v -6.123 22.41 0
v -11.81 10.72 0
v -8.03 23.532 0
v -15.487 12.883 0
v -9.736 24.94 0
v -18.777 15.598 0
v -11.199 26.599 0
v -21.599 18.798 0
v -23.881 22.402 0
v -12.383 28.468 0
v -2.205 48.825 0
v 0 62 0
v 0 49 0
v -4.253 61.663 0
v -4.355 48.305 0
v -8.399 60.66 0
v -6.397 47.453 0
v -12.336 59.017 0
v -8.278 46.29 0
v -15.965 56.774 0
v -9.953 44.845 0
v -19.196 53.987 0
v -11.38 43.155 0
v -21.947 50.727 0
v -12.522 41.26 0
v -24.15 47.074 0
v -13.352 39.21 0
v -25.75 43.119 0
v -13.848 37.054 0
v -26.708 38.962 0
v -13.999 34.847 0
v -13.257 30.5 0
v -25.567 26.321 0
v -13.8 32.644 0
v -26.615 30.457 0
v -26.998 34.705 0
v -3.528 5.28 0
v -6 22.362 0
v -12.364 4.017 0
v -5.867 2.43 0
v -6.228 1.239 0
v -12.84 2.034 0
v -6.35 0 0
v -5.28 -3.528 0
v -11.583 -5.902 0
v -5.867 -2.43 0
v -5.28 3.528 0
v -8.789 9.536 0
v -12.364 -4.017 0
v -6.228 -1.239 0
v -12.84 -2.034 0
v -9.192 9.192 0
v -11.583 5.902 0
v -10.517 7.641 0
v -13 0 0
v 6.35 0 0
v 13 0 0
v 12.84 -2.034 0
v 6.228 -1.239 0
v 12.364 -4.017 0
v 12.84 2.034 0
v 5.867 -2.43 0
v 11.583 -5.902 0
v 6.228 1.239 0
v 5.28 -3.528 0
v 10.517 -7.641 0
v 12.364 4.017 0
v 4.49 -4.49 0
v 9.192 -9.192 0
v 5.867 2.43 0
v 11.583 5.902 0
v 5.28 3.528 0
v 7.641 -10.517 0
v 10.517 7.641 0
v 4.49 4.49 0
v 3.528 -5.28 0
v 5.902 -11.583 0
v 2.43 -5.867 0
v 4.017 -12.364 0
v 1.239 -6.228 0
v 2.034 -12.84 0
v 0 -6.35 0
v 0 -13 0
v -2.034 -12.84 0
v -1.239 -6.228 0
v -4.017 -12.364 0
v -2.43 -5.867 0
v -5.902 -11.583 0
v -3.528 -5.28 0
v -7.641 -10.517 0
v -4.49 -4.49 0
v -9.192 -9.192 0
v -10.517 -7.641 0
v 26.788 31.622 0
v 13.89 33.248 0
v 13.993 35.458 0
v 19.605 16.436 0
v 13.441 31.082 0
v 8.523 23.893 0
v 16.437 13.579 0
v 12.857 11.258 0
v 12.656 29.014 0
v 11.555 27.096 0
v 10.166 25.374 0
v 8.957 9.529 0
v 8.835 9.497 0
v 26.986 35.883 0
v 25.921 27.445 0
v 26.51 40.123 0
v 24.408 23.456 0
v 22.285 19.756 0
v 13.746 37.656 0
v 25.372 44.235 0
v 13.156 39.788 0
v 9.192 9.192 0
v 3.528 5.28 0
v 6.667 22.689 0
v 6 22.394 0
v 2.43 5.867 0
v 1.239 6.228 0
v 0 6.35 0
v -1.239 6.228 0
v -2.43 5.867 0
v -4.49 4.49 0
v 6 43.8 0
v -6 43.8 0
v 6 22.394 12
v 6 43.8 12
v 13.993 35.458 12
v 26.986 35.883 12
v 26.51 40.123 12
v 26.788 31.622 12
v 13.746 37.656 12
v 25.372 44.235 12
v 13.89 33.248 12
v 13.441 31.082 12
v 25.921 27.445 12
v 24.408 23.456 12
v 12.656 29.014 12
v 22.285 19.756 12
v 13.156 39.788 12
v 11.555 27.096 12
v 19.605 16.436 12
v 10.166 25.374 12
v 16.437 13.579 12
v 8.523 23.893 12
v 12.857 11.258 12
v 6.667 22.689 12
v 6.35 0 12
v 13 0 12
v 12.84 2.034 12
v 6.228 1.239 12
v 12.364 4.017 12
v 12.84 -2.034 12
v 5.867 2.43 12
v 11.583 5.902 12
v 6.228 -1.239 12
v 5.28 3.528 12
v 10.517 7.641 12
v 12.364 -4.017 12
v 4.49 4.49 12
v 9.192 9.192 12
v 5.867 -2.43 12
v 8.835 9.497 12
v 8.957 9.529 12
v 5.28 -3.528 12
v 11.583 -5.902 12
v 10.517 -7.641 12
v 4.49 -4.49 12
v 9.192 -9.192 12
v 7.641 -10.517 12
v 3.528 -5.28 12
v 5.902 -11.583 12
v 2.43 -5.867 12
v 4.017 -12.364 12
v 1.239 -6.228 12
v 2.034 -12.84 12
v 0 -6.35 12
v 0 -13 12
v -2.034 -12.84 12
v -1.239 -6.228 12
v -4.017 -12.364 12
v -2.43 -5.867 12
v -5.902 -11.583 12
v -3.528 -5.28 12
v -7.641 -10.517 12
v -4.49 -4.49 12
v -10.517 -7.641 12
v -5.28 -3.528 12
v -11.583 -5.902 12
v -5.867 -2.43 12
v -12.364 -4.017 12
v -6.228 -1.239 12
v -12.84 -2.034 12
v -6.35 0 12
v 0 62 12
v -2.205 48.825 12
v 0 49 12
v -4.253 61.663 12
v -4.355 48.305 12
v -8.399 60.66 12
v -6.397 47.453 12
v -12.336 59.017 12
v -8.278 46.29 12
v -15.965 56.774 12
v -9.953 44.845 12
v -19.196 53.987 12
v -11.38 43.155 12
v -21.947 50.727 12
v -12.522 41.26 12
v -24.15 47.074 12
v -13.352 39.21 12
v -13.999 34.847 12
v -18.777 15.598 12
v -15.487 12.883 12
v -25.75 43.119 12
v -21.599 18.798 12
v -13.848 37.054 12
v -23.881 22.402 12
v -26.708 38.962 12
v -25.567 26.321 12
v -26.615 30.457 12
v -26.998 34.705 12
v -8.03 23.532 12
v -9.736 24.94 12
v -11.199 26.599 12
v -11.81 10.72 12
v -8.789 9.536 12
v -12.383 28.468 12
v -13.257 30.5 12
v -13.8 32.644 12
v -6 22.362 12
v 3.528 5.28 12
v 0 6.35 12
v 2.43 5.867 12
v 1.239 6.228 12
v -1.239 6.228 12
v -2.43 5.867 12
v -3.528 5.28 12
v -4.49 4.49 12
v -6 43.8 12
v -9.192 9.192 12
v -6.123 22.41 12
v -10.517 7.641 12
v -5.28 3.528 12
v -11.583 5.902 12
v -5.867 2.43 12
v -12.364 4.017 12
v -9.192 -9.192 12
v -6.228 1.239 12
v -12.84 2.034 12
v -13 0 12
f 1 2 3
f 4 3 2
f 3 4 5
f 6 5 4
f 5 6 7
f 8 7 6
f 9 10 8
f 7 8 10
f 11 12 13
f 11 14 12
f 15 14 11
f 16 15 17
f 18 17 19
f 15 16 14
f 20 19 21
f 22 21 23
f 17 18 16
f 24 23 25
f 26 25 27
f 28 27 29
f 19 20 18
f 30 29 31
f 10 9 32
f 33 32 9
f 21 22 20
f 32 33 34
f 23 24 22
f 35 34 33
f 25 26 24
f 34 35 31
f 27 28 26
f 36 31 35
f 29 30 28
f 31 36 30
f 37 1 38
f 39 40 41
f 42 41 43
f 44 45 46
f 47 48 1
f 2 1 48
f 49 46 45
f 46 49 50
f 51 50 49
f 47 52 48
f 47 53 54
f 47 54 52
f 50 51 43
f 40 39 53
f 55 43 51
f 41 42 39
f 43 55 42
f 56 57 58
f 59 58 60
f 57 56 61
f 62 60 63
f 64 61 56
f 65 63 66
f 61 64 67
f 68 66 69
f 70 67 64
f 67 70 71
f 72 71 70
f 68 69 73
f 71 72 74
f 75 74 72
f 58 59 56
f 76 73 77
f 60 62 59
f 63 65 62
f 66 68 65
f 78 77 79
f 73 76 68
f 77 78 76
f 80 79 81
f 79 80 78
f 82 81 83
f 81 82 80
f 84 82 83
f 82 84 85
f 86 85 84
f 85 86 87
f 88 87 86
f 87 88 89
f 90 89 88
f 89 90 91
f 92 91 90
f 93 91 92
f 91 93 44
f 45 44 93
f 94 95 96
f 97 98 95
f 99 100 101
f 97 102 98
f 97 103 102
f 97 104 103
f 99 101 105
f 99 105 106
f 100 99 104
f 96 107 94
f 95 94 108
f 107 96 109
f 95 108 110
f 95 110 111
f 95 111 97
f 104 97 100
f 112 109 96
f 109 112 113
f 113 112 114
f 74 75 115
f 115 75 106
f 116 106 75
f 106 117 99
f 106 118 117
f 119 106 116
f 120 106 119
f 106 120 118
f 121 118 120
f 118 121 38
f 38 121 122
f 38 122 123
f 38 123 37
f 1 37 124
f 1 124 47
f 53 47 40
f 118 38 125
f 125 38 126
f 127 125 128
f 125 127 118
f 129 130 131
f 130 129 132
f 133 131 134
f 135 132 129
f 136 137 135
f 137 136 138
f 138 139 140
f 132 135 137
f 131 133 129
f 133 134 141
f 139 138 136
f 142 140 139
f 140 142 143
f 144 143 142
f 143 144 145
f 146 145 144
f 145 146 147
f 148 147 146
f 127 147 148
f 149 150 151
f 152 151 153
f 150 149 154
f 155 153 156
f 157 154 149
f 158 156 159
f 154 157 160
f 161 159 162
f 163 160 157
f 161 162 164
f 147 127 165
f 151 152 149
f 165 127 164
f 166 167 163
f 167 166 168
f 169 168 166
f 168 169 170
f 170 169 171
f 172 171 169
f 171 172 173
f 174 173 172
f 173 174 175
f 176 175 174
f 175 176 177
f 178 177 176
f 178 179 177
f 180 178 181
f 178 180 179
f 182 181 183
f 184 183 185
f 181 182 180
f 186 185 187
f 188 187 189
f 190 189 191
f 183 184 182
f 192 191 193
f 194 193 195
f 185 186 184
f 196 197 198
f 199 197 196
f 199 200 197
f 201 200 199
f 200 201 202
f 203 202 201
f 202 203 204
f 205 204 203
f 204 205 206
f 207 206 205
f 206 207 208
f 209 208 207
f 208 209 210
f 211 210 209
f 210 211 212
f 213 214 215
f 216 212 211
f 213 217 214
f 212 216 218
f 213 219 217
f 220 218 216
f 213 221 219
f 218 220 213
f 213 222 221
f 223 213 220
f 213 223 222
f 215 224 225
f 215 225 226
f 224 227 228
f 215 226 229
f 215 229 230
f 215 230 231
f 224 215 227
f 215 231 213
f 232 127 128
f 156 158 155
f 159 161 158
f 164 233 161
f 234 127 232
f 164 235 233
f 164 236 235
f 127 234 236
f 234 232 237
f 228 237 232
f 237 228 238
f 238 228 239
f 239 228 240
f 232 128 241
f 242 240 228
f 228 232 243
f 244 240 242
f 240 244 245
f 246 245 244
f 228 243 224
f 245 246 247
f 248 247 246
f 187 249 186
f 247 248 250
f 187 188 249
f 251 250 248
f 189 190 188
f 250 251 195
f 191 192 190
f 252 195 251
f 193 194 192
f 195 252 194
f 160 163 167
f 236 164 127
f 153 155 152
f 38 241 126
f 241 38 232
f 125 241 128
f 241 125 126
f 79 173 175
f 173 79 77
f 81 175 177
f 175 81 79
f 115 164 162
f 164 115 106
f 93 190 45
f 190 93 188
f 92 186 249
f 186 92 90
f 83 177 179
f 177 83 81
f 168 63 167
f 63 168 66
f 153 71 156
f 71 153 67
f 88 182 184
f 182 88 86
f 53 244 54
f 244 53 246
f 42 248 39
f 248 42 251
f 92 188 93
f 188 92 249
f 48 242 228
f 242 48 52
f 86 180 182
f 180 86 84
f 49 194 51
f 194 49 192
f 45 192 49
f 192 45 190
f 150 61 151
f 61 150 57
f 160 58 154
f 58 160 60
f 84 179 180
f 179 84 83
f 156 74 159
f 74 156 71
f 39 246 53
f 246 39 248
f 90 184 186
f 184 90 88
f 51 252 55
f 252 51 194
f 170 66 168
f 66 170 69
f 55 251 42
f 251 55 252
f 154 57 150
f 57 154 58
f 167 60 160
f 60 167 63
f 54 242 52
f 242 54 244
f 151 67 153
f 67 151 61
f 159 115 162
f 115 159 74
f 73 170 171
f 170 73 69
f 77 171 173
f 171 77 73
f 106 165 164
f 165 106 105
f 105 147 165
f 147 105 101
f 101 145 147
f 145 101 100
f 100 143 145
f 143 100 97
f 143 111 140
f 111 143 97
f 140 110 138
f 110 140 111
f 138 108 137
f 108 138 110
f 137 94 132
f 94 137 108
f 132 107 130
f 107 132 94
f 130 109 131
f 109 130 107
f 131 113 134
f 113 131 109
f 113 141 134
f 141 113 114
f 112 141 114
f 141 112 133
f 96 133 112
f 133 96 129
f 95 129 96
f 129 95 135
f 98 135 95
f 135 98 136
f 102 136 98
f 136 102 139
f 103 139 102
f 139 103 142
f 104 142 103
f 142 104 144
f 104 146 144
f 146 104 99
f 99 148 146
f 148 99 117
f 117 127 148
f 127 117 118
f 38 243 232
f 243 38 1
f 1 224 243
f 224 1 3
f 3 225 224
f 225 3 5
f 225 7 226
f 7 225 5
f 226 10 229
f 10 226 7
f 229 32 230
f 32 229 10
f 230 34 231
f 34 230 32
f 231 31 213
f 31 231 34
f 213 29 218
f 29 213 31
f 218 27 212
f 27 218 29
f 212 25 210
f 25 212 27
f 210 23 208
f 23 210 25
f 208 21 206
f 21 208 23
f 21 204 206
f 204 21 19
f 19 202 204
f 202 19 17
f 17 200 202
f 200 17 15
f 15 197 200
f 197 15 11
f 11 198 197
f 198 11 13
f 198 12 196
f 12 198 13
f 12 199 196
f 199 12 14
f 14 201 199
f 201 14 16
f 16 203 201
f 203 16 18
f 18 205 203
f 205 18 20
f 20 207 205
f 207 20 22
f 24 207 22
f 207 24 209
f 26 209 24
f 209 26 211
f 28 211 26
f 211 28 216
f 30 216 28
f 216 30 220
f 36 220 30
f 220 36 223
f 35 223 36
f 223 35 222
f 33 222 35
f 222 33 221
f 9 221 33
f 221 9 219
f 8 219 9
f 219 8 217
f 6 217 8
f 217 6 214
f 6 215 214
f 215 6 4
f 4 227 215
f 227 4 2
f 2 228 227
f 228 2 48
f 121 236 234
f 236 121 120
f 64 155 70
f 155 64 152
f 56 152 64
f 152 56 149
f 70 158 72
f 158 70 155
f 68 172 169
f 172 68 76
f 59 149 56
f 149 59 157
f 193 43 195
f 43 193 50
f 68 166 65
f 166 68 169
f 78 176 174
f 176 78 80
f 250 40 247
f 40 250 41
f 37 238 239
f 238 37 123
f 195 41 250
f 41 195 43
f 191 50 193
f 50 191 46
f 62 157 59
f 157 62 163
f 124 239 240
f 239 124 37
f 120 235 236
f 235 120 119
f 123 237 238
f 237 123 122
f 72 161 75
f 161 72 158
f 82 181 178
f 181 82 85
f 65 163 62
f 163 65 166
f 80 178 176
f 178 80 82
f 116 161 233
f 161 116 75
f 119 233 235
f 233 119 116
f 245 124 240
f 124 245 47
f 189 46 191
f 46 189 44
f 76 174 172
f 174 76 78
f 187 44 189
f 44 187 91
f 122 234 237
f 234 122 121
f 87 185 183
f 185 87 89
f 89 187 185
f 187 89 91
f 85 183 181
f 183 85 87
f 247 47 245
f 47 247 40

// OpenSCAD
$fn = 32;

// ----------------------------------------------------------------------
// Hook: 70 mm shank into a 14 mm curl, 12 mm thick
// ----------------------------------------------------------------------

// --- parameters (mm) ---
shank_len = 70;           // shank length from the boss centre
shank_w = 12;             // shank width
boss_d = 26;              // boss diameter
bore_d = 12.7;            // boss bore
curl_in = 14;             // curl inner radius
curl_out = 27;            // curl outer radius
curl_sweep = 290;         // curl sweep angle
hook_t = 12;              // hook thickness

shank_profile = [[-6, 43.8], [6, 43.8], [6, 11], [-6, 11]];
boss_profile = [[13, 0], [12.84, 2.034], [12.364, 4.017], [11.583, 5.902], [10.517, 7.641], [9.192, 9.192], [7.641, 10.517], [5.902, 11.583], [4.017, 12.364], [2.034, 12.84], [0, 13], [-2.034, 12.84], [-4.017, 12.364], [-5.902, 11.583], [-7.641, 10.517], [-9.192, 9.192], [-10.517, 7.641], [-11.583, 5.902], [-12.364, 4.017], [-12.84, 2.034], [-13, 0], [-12.84, -2.034], [-12.364, -4.017], [-11.583, -5.902], [-10.517, -7.641], [-9.192, -9.192], [-7.641, -10.517], [-5.902, -11.583], [-4.017, -12.364], [-2.034, -12.84], [0, -13], [2.034, -12.84], [4.017, -12.364], [5.902, -11.583], [7.641, -10.517], [9.192, -9.192], [10.517, -7.641], [11.583, -5.902], [12.364, -4.017], [12.84, -2.034]];
curl_profile = [[0, 62], [-4.253, 61.663], [-8.399, 60.66], [-12.336, 59.017], [-15.965, 56.774], [-19.196, 53.987], [-21.947, 50.727], [-24.15, 47.074], [-25.75, 43.119], [-26.708, 38.962], [-26.998, 34.705], [-26.615, 30.457], [-25.567, 26.321], [-23.881, 22.402], [-21.599, 18.798], [-18.777, 15.598], [-15.487, 12.883], [-11.81, 10.72], [-7.838, 9.163], [-3.67, 8.251], [0.589, 8.006], [4.833, 8.436], [8.957, 9.529], [12.857, 11.258], [16.437, 13.579], [19.605, 16.436], [22.285, 19.756], [24.408, 23.456], [25.921, 27.445], [26.788, 31.622], [26.986, 35.883], [26.51, 40.123], [25.372, 44.235], [13.156, 39.788], [13.746, 37.656], [13.993, 35.458], [13.89, 33.248], [13.441, 31.082], [12.656, 29.014], [11.555, 27.096], [10.166, 25.374], [8.523, 23.893], [6.667, 22.689], [4.644, 21.793], [2.506, 21.226], [0.305, 21.003], [-1.903, 21.13], [-4.064, 21.603], [-6.123, 22.41], [-8.03, 23.532], [-9.736, 24.94], [-11.199, 26.599], [-12.383, 28.468], [-13.257, 30.5], [-13.8, 32.644], [-13.999, 34.847], [-13.848, 37.054], [-13.352, 39.21], [-12.522, 41.26], [-11.38, 43.155], [-9.953, 44.845], [-8.278, 46.29], [-6.397, 47.453], [-4.355, 48.305], [-2.205, 48.825], [0, 49]];

difference() {
  union() {
    /* three overlapping outlines: shank, boss and the smooth curl */
    linear_extrude(height = hook_t) polygon(shank_profile);
    linear_extrude(height = hook_t) polygon(boss_profile);
    linear_extrude(height = hook_t) polygon(curl_profile);
  }
  translate([0, 0, -2.5]) cylinder(h = hook_t + 5, d = bore_d);
}
